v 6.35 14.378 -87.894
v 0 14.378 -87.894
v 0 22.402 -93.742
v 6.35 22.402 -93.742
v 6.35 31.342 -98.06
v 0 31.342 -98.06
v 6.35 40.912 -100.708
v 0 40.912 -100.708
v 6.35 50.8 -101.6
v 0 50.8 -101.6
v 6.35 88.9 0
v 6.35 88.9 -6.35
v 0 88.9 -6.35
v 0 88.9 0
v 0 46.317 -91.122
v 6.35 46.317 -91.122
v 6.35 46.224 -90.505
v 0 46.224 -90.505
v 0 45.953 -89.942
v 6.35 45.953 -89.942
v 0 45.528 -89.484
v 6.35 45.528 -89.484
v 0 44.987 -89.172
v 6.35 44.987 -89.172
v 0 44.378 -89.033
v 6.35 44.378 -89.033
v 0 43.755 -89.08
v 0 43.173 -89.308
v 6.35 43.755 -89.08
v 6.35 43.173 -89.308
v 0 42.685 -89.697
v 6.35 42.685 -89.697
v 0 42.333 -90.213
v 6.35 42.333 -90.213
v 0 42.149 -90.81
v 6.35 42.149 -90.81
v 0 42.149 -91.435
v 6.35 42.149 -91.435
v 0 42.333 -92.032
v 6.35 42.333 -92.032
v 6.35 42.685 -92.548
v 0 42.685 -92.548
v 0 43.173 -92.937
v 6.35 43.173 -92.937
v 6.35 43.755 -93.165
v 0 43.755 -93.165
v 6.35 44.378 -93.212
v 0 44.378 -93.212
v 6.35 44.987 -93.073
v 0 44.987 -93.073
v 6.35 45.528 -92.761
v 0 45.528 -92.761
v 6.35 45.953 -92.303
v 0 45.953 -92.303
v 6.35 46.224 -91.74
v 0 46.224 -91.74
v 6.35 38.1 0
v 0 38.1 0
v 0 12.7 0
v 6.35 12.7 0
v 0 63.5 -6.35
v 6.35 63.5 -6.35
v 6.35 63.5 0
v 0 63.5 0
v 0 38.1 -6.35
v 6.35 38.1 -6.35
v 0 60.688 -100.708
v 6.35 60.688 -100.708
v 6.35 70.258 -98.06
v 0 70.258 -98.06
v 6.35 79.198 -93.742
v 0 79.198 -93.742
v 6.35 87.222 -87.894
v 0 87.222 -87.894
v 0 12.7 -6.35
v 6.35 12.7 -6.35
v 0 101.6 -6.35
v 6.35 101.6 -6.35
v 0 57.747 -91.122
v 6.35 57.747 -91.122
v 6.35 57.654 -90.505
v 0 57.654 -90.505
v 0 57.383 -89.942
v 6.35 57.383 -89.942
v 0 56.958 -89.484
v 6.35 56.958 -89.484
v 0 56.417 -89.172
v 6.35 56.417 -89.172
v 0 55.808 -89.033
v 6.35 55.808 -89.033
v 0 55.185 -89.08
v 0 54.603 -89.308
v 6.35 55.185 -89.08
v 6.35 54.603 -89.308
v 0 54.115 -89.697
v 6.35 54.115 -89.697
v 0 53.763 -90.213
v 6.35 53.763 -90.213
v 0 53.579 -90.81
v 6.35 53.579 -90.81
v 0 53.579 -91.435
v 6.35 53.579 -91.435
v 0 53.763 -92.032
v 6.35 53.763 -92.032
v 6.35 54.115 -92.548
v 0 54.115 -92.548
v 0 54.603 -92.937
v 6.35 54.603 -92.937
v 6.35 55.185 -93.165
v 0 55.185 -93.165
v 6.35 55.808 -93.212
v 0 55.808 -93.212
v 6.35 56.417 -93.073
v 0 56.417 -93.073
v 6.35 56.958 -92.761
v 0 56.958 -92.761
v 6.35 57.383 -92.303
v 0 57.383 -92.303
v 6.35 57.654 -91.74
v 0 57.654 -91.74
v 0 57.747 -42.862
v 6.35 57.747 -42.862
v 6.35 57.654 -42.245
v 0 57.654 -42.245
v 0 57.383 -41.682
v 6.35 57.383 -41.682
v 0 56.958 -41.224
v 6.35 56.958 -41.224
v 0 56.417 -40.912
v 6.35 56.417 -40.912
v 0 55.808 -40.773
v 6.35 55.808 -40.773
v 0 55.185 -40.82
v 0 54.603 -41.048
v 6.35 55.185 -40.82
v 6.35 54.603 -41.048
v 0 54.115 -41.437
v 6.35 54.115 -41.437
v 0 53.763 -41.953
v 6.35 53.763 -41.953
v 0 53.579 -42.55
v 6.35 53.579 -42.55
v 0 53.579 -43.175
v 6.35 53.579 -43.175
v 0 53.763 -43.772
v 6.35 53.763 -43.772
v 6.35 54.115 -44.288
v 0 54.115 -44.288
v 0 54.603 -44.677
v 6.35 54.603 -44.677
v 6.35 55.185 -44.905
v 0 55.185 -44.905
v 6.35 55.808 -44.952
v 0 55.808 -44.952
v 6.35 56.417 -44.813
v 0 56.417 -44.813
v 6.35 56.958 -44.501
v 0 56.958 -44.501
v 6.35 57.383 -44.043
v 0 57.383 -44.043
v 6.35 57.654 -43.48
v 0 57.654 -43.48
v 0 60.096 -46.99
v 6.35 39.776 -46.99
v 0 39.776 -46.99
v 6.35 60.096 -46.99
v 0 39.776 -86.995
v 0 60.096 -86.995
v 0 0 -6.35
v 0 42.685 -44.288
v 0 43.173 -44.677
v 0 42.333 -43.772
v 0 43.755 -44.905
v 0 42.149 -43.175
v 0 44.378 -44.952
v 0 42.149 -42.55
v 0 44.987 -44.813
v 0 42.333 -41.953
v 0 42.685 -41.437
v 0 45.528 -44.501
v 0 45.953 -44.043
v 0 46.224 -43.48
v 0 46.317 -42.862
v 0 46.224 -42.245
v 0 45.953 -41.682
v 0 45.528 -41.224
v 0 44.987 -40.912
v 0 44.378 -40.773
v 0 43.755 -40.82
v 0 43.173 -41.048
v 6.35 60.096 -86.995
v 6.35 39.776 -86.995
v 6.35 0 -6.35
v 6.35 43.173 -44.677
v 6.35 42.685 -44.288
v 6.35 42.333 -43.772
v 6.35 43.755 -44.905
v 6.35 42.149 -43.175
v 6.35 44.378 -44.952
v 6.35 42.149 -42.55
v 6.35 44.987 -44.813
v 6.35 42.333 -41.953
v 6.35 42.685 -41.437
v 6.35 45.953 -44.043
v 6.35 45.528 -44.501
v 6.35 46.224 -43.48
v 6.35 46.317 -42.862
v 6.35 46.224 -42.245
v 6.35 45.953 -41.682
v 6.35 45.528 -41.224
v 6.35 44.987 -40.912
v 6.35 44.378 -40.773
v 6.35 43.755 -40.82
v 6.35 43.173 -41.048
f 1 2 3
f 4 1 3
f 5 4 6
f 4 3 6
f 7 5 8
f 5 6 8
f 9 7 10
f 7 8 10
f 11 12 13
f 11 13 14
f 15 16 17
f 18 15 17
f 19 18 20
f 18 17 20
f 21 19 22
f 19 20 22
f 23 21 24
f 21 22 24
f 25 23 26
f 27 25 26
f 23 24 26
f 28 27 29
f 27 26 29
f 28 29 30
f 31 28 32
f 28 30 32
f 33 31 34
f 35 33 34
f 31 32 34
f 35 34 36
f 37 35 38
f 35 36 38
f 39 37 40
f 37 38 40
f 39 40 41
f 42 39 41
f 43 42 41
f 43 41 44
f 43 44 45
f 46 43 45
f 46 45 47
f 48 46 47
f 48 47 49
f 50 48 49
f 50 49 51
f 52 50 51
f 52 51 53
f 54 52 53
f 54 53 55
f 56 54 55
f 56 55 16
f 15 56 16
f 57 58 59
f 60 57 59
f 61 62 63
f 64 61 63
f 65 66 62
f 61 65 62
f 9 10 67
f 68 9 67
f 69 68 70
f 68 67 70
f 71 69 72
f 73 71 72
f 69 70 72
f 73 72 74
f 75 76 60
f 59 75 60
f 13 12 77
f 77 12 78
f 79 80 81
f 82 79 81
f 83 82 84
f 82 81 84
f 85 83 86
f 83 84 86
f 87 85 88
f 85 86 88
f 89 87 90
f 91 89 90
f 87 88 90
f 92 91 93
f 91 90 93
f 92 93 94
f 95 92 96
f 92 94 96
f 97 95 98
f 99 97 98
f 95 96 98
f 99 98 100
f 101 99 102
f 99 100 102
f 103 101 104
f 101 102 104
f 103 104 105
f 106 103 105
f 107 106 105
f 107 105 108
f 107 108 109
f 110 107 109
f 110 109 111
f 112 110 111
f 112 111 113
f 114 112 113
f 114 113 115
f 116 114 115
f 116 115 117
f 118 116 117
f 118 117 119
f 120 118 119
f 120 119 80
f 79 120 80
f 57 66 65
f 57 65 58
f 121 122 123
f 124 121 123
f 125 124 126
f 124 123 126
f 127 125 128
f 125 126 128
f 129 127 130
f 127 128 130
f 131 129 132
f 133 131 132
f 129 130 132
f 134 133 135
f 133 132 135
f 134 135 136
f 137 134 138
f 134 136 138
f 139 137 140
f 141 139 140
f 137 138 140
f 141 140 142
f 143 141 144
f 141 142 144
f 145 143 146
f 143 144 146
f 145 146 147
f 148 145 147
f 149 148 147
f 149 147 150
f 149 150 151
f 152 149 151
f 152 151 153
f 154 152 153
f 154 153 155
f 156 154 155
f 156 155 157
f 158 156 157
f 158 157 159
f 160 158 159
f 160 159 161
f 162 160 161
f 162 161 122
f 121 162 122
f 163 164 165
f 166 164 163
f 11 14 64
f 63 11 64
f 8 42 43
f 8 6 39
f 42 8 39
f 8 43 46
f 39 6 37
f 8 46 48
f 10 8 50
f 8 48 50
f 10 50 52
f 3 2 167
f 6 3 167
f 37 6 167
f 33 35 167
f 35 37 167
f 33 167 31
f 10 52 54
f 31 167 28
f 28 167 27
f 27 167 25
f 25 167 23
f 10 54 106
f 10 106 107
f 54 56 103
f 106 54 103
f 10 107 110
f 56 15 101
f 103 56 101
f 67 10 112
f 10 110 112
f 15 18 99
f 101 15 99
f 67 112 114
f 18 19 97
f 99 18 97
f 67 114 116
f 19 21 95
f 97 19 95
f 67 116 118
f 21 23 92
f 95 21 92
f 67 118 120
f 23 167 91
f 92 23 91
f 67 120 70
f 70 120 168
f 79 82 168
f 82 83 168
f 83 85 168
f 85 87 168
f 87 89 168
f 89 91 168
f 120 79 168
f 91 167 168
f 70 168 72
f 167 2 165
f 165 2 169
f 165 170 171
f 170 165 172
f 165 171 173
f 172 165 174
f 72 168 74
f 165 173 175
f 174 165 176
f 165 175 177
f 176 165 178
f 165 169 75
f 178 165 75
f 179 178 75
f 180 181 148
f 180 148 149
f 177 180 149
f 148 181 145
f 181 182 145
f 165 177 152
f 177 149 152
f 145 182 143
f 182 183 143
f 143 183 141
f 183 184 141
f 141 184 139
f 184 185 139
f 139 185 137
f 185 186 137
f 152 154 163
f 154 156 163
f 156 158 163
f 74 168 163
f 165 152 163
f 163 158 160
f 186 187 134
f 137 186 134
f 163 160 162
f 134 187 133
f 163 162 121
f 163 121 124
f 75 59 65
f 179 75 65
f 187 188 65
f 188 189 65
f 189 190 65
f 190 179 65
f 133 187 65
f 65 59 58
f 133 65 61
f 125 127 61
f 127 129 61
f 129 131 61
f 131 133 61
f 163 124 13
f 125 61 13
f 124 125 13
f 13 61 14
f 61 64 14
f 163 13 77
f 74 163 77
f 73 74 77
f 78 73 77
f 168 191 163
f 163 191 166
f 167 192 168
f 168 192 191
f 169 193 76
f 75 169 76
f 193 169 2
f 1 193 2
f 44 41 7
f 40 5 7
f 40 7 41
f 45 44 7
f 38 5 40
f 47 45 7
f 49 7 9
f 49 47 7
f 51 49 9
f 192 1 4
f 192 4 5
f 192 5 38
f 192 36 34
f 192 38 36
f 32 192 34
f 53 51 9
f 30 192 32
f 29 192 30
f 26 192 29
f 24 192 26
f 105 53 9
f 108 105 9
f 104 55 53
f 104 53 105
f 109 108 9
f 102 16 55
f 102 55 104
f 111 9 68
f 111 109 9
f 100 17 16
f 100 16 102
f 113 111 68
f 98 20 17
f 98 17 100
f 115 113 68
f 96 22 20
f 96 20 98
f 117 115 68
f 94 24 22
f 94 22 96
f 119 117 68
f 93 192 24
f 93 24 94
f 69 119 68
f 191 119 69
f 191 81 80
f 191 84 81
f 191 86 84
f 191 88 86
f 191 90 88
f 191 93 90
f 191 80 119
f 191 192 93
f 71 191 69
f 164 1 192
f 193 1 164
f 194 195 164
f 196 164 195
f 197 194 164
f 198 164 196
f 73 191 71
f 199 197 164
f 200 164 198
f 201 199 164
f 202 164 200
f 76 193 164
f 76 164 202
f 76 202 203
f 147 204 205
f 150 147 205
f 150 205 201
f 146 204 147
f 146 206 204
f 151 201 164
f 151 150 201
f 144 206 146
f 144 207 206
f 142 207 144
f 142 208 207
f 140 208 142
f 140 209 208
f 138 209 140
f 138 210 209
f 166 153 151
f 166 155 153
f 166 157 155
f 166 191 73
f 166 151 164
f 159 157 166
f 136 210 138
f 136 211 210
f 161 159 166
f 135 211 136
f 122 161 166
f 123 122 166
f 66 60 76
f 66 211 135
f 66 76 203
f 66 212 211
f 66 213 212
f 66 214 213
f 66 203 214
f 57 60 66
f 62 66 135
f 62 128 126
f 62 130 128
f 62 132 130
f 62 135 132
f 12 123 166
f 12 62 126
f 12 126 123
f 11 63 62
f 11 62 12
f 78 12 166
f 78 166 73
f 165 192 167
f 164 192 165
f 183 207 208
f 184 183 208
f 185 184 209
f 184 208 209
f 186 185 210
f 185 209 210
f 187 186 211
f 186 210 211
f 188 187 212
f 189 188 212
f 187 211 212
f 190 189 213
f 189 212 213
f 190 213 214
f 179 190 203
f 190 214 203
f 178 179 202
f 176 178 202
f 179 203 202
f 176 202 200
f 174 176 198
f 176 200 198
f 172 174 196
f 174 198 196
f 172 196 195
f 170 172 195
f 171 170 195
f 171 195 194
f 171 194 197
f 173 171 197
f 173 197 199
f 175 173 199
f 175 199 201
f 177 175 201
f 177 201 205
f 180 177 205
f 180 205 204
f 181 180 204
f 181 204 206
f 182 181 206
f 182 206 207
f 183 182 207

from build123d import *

# Parameters (mm, degrees)
F1_DEPTH = 6.35
F2_W     = 12.7
F2_H     = 6.35
F3_DEPTH = 25.4
F4_W     = 20.32
F4_H     = 40.005
F4_R     = 2.0955
F5_DEPTH = 25.4


# Not quite as in the source:
# - a feature names something its author has since deleted; it is built from what else it names


with BuildPart() as f1:
    # F0 (on Right) → F1 (new body)
    with BuildSketch(Plane.YZ):
        with BuildLine():
            Line((50.8, 0), (0, 0))
            Line((0, 0), (0, -6.35))
            Line((0, -6.35), (14.3783799252, -87.8938446653))
            ThreePointArc((14.3783799252, -87.8938446653), (31.3423979963, -98.0600456848), (50.8, -101.6))
            Line((50.8, -101.6), (50.8, 0))
        make_face()
        with BuildLine():
            Line((101.6, 0), (50.8, 0))
            Line((50.8, 0), (50.8, -101.6))
            ThreePointArc((50.8, -101.6), (70.2576020037, -98.0600456848), (87.2216200748, -87.8938446653))
            Line((87.2216200748, -87.8938446653), (101.6, -6.35))
            Line((101.6, -6.35), (101.6, 0))
        make_face()
    extrude(amount=F1_DEPTH)

    # F2 (on face) → F3 (cut)
    with BuildSketch(Plane.YZ.offset(6.35)):
        with Locations((95.25, -3.175)):
            Rectangle(F2_W, F2_H)
        with Locations((44.45, -3.175)):
            Rectangle(F2_W, F2_H)
        with Locations((6.35, -3.175)):
            Rectangle(F2_W, F2_H)
        with Locations((57.15, -3.175)):
            Rectangle(F2_W, F2_H)
    extrude(amount=-F3_DEPTH, mode=Mode.SUBTRACT)

    # F4 (on face) → F5 (cut)
    with BuildSketch(Plane.YZ.offset(6.35)):
        with Locations((49.9361574873, -66.9925)):
            Rectangle(F4_W, F4_H)
        with Locations((44.2211574873, -42.8625)):
            Circle(F4_R)
        with Locations((55.6511574873, -42.8625)):
            Circle(F4_R)
        with Locations((55.6511574873, -91.1225)):
            Circle(F4_R)
        with Locations((44.2211574873, -91.1225)):
            Circle(F4_R)
    extrude(amount=-F5_DEPTH, mode=Mode.SUBTRACT)


solid = f1.part
